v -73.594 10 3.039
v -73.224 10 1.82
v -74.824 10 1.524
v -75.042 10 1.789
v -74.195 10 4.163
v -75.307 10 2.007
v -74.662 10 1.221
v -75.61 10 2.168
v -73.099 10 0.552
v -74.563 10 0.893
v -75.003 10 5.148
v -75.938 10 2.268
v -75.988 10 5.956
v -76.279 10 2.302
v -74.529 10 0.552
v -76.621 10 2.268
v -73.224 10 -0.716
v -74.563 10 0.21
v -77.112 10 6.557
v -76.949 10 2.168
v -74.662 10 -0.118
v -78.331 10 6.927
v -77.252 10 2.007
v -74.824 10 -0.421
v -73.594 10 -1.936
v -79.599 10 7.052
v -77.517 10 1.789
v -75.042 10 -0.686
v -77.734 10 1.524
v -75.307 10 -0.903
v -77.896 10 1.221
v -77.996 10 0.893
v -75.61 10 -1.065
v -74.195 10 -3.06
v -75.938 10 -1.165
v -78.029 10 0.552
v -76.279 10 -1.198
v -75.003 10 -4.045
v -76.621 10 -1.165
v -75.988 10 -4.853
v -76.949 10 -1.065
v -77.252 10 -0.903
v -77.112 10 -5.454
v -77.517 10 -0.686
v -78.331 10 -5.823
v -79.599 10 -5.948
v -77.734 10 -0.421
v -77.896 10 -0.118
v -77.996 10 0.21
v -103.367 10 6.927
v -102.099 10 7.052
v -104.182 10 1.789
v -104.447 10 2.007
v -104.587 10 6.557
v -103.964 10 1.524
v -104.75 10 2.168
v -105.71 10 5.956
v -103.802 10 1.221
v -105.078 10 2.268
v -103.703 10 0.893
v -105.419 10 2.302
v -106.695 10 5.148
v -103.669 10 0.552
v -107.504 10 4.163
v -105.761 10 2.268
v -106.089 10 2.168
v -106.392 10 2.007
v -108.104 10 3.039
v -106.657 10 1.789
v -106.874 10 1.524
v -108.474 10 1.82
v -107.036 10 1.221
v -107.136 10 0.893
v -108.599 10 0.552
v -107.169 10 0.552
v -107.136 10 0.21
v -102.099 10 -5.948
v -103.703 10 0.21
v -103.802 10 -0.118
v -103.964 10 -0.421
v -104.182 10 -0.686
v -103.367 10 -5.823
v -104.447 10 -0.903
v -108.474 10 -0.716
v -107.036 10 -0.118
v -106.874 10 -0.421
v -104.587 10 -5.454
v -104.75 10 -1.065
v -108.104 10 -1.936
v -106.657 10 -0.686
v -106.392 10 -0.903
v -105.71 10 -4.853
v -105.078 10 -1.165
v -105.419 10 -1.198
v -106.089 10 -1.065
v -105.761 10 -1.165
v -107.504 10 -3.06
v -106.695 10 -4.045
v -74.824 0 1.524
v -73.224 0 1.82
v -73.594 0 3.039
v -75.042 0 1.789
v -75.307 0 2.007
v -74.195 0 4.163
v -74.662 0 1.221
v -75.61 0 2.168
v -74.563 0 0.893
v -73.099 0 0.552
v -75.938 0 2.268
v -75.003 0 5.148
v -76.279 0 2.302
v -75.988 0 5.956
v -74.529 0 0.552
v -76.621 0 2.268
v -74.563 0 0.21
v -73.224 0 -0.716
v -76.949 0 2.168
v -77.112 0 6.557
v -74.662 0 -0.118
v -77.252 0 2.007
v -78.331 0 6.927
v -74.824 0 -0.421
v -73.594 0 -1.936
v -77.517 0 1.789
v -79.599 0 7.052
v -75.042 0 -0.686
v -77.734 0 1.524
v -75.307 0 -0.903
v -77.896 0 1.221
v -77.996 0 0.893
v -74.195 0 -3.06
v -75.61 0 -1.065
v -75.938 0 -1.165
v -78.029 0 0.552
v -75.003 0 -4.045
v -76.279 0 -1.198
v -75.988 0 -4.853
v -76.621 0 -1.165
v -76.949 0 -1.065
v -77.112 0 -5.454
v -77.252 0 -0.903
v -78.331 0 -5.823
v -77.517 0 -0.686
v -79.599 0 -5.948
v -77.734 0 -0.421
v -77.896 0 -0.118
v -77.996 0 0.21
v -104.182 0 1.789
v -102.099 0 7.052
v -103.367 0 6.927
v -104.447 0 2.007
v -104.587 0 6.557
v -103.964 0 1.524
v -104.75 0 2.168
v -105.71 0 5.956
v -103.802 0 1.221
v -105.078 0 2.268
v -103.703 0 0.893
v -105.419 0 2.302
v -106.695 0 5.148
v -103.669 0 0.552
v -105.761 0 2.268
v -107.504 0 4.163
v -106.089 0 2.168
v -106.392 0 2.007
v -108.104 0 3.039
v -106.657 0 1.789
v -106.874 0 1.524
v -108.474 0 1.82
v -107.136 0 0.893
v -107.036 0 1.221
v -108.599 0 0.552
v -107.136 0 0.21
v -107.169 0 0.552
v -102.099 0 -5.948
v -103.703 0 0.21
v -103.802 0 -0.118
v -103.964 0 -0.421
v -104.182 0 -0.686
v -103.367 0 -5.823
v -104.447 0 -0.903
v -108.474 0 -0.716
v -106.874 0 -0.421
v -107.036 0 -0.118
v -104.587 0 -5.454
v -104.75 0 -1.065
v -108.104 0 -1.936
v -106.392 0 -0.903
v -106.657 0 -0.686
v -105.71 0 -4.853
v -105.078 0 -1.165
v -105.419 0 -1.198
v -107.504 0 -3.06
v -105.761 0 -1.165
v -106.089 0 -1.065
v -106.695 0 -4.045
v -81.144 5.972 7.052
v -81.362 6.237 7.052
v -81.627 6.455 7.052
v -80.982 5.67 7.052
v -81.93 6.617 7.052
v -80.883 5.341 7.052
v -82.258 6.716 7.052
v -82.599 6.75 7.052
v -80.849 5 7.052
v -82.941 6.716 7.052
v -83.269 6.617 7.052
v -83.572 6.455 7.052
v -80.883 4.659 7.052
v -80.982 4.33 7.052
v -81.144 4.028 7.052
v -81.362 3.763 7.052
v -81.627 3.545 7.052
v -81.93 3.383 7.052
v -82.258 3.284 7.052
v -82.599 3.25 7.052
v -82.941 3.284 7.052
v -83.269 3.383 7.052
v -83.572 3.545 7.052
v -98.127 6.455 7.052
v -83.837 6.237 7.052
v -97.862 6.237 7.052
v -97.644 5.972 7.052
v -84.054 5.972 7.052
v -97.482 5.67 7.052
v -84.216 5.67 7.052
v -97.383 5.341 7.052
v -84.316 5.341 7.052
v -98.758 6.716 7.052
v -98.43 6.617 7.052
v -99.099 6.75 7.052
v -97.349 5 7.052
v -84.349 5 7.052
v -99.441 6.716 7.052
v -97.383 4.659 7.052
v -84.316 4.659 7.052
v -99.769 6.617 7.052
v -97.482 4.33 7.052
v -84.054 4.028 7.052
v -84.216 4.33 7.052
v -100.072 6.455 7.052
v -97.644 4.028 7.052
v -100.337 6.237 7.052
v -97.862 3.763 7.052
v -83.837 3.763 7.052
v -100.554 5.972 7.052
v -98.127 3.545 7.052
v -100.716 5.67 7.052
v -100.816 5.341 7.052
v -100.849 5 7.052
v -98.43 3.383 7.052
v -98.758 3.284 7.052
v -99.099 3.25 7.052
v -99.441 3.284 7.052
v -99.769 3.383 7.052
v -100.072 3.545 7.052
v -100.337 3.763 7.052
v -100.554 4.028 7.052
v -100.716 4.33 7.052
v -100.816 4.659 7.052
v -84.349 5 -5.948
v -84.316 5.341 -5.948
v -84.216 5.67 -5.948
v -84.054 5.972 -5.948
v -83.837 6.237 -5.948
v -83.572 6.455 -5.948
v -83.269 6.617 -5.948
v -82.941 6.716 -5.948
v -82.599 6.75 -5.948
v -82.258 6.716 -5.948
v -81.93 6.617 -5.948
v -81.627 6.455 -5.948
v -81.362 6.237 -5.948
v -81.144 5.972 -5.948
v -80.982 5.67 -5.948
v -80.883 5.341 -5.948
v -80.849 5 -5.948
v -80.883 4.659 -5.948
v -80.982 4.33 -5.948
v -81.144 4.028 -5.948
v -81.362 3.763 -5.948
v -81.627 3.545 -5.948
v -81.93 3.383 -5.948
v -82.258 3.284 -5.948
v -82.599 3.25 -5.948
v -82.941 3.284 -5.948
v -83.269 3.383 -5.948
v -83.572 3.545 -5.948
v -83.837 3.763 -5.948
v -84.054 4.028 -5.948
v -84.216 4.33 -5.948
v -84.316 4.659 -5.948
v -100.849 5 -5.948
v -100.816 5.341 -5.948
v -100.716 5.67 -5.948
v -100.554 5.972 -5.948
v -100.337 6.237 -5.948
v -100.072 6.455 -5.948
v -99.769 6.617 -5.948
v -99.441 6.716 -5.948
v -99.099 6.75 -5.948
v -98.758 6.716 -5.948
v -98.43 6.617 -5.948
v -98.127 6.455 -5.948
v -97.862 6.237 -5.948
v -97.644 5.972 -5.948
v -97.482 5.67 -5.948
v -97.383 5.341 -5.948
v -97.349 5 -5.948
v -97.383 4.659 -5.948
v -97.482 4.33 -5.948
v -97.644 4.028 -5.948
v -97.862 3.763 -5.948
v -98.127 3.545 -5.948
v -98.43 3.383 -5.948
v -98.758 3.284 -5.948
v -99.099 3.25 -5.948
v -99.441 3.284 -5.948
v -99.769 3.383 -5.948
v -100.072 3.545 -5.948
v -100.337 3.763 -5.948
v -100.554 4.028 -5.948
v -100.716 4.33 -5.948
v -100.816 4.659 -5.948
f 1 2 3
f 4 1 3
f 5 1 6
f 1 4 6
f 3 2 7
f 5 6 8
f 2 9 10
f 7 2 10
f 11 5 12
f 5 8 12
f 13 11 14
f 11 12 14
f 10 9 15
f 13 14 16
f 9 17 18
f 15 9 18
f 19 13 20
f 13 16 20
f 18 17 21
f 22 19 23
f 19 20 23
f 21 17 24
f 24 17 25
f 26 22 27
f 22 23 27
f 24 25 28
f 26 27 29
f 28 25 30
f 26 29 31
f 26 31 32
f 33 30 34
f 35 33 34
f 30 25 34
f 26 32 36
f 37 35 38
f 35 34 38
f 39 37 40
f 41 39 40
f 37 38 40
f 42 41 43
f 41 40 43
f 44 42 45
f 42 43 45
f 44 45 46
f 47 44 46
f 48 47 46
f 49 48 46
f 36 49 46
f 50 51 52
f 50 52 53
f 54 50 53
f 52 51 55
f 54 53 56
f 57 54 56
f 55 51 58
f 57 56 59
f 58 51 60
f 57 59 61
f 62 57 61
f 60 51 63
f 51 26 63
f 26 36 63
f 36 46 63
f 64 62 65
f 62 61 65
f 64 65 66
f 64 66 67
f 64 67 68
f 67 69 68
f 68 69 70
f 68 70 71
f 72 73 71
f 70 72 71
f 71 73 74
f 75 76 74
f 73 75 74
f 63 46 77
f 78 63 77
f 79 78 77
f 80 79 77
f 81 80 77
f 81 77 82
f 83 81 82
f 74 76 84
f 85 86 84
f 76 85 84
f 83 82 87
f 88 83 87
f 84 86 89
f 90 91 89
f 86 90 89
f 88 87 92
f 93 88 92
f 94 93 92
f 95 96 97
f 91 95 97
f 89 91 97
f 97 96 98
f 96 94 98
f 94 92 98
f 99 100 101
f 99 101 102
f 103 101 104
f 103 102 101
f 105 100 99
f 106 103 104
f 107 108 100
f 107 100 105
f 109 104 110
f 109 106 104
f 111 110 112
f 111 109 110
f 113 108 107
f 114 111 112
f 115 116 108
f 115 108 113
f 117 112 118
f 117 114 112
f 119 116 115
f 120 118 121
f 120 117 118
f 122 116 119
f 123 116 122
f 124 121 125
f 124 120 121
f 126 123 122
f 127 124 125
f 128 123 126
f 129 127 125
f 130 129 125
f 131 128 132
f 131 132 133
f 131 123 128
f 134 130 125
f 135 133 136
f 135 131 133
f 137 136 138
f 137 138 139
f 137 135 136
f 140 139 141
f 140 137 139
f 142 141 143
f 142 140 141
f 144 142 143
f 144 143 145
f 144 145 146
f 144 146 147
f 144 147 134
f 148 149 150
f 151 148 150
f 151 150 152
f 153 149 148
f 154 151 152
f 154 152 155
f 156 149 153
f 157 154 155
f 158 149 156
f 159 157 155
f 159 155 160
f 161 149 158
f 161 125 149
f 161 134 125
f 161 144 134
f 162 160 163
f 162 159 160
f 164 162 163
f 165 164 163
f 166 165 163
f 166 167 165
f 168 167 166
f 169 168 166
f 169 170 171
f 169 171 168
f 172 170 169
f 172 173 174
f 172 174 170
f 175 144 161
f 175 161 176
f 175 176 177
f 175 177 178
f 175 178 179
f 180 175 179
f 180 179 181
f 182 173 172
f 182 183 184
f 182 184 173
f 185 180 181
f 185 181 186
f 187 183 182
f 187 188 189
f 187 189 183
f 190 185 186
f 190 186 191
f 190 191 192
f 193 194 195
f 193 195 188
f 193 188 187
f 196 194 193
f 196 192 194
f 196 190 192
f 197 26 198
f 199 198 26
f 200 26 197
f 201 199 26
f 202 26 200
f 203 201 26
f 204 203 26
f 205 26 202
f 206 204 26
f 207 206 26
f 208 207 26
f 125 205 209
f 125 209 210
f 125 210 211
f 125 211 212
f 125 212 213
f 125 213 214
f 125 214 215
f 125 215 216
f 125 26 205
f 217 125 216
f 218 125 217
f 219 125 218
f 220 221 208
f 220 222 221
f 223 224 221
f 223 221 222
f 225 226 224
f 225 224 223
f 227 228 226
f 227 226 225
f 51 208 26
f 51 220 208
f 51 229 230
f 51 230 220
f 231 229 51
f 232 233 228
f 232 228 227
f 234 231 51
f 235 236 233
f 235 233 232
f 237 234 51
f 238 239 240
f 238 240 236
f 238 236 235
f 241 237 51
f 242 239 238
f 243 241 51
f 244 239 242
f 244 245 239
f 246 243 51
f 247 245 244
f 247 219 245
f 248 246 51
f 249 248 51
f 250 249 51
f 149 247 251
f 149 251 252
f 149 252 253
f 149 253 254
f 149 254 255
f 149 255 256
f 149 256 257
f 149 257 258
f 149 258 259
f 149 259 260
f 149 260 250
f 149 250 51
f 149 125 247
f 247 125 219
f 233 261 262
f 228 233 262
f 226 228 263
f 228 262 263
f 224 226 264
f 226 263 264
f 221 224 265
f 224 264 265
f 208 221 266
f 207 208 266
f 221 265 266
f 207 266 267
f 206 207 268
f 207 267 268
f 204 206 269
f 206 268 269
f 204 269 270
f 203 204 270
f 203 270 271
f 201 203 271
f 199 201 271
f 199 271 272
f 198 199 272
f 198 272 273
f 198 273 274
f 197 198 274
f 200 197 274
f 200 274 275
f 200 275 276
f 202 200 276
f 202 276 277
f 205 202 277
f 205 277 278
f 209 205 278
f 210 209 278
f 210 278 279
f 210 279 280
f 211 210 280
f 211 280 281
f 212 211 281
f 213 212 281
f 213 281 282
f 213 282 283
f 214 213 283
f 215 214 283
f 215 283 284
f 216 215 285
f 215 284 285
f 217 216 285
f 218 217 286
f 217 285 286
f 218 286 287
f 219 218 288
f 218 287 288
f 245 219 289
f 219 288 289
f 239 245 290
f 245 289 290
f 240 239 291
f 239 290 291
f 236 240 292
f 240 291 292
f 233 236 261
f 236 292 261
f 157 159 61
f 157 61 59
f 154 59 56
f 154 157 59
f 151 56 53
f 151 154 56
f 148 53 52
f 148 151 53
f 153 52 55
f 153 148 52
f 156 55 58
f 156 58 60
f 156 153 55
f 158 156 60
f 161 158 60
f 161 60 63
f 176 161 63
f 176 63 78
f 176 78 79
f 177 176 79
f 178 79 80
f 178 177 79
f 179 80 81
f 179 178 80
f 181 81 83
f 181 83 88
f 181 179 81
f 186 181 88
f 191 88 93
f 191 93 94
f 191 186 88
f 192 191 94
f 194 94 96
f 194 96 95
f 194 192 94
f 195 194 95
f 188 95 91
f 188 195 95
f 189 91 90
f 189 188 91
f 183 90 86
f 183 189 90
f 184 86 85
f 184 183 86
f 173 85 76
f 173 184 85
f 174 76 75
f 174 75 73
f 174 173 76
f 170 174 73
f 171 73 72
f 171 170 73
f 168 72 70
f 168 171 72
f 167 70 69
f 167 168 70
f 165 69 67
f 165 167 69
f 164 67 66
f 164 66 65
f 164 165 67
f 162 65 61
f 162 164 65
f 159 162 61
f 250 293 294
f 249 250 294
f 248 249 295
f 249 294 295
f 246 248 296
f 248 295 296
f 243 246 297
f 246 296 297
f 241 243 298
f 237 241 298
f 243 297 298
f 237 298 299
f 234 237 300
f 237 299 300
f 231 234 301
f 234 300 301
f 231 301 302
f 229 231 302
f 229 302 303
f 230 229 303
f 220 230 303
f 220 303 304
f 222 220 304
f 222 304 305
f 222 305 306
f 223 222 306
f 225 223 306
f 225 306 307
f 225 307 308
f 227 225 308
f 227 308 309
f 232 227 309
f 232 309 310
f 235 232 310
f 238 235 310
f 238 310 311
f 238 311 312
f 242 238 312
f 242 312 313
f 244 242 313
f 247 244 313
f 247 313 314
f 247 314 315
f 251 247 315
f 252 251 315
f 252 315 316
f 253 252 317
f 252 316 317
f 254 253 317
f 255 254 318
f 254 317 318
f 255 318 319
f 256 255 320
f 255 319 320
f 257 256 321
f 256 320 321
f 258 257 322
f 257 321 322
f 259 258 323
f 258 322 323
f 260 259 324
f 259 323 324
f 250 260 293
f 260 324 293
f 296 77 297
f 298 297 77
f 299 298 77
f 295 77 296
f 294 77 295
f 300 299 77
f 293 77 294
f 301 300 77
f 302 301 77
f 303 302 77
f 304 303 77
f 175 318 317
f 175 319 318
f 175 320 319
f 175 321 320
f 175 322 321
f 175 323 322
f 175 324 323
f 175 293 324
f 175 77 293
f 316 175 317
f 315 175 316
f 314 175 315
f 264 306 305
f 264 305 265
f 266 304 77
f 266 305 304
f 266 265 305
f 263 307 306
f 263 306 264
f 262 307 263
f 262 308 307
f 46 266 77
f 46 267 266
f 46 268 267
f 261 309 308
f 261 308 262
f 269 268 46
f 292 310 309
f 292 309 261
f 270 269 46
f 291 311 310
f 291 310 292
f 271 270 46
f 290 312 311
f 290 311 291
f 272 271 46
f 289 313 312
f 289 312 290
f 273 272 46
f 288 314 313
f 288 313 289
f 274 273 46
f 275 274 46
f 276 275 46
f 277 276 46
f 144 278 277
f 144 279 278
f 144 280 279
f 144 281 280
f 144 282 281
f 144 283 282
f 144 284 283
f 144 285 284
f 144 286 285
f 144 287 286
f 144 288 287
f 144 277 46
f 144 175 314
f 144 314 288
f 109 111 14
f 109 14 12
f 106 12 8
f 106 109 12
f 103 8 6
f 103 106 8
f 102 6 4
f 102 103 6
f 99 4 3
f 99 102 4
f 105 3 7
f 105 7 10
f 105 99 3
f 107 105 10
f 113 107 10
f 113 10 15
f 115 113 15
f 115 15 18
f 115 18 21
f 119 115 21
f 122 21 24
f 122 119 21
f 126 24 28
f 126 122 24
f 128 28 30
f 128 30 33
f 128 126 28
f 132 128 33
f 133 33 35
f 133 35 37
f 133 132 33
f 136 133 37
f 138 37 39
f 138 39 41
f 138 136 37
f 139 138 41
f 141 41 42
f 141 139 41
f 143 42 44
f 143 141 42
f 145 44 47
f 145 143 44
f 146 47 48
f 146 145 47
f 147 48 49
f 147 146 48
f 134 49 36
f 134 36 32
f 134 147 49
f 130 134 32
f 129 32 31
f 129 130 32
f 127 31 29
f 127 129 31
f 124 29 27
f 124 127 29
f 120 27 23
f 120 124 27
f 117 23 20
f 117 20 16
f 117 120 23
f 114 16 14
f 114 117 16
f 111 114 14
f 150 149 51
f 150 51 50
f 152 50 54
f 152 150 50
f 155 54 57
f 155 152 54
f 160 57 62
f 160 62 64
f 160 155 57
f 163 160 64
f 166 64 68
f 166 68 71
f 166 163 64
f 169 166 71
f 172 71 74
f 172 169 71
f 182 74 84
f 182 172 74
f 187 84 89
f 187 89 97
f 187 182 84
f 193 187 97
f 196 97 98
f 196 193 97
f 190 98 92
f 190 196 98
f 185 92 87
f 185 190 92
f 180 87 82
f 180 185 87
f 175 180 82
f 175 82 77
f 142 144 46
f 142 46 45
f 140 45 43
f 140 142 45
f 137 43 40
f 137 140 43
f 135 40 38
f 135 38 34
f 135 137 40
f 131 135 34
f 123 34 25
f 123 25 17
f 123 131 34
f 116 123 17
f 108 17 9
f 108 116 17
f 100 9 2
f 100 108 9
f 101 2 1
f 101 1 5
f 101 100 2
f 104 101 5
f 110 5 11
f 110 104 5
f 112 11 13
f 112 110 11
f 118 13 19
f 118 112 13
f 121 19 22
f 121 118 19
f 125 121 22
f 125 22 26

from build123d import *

# Parameters (mm, degrees)
SKETCH_1_R          = 1.75
EXTRUDE_1_DEPTH     = 10
SKETCH_2_R          = 1.75
CUT_EXTRUDE_1_DEPTH = 21


with BuildPart() as part:
    # 草图1 → 凸台-拉伸1 (new body)
    with BuildSketch(Plane(origin=(0, 0, 0), x_dir=(1, 0, 0), z_dir=(0, 1, 0))):
        with BuildLine():
            Line((-102.099280991, 5.948332783), (-79.599280991, 5.948332783))
            ThreePointArc((-79.599280991, 5.948332783), (-73.099280991, -0.551667217), (-79.599280991, -7.051667217))
            Line((-79.599280991, -7.051667217), (-102.099280991, -7.051667217))
            ThreePointArc((-102.099280991, -7.051667217), (-108.599280991, -0.551667217), (-102.099280991, 5.948332783))
        make_face()
        with Locations(Location((-105.419280991, -0.551667217, 0), (0, 0, 270))):
            Circle(SKETCH_1_R, mode=Mode.SUBTRACT)
        with Locations(Location((-76.279280991, -0.551667217, 0), (0, 0, 270))):
            Circle(SKETCH_1_R, mode=Mode.SUBTRACT)
    extrude(amount=EXTRUDE_1_DEPTH)

    # 草图2 → 切除-拉伸1 (cut)
    with BuildSketch(Plane(origin=(0, 0, -5.948332783), x_dir=(-1, 0, 0), z_dir=(0, 0, -1))):
        with Locations((99.099280991, 5)):
            Circle(SKETCH_2_R)
        with Locations((82.599280991, 5)):
            Circle(SKETCH_2_R)
    extrude(amount=-CUT_EXTRUDE_1_DEPTH, mode=Mode.SUBTRACT)


solid = part.part
